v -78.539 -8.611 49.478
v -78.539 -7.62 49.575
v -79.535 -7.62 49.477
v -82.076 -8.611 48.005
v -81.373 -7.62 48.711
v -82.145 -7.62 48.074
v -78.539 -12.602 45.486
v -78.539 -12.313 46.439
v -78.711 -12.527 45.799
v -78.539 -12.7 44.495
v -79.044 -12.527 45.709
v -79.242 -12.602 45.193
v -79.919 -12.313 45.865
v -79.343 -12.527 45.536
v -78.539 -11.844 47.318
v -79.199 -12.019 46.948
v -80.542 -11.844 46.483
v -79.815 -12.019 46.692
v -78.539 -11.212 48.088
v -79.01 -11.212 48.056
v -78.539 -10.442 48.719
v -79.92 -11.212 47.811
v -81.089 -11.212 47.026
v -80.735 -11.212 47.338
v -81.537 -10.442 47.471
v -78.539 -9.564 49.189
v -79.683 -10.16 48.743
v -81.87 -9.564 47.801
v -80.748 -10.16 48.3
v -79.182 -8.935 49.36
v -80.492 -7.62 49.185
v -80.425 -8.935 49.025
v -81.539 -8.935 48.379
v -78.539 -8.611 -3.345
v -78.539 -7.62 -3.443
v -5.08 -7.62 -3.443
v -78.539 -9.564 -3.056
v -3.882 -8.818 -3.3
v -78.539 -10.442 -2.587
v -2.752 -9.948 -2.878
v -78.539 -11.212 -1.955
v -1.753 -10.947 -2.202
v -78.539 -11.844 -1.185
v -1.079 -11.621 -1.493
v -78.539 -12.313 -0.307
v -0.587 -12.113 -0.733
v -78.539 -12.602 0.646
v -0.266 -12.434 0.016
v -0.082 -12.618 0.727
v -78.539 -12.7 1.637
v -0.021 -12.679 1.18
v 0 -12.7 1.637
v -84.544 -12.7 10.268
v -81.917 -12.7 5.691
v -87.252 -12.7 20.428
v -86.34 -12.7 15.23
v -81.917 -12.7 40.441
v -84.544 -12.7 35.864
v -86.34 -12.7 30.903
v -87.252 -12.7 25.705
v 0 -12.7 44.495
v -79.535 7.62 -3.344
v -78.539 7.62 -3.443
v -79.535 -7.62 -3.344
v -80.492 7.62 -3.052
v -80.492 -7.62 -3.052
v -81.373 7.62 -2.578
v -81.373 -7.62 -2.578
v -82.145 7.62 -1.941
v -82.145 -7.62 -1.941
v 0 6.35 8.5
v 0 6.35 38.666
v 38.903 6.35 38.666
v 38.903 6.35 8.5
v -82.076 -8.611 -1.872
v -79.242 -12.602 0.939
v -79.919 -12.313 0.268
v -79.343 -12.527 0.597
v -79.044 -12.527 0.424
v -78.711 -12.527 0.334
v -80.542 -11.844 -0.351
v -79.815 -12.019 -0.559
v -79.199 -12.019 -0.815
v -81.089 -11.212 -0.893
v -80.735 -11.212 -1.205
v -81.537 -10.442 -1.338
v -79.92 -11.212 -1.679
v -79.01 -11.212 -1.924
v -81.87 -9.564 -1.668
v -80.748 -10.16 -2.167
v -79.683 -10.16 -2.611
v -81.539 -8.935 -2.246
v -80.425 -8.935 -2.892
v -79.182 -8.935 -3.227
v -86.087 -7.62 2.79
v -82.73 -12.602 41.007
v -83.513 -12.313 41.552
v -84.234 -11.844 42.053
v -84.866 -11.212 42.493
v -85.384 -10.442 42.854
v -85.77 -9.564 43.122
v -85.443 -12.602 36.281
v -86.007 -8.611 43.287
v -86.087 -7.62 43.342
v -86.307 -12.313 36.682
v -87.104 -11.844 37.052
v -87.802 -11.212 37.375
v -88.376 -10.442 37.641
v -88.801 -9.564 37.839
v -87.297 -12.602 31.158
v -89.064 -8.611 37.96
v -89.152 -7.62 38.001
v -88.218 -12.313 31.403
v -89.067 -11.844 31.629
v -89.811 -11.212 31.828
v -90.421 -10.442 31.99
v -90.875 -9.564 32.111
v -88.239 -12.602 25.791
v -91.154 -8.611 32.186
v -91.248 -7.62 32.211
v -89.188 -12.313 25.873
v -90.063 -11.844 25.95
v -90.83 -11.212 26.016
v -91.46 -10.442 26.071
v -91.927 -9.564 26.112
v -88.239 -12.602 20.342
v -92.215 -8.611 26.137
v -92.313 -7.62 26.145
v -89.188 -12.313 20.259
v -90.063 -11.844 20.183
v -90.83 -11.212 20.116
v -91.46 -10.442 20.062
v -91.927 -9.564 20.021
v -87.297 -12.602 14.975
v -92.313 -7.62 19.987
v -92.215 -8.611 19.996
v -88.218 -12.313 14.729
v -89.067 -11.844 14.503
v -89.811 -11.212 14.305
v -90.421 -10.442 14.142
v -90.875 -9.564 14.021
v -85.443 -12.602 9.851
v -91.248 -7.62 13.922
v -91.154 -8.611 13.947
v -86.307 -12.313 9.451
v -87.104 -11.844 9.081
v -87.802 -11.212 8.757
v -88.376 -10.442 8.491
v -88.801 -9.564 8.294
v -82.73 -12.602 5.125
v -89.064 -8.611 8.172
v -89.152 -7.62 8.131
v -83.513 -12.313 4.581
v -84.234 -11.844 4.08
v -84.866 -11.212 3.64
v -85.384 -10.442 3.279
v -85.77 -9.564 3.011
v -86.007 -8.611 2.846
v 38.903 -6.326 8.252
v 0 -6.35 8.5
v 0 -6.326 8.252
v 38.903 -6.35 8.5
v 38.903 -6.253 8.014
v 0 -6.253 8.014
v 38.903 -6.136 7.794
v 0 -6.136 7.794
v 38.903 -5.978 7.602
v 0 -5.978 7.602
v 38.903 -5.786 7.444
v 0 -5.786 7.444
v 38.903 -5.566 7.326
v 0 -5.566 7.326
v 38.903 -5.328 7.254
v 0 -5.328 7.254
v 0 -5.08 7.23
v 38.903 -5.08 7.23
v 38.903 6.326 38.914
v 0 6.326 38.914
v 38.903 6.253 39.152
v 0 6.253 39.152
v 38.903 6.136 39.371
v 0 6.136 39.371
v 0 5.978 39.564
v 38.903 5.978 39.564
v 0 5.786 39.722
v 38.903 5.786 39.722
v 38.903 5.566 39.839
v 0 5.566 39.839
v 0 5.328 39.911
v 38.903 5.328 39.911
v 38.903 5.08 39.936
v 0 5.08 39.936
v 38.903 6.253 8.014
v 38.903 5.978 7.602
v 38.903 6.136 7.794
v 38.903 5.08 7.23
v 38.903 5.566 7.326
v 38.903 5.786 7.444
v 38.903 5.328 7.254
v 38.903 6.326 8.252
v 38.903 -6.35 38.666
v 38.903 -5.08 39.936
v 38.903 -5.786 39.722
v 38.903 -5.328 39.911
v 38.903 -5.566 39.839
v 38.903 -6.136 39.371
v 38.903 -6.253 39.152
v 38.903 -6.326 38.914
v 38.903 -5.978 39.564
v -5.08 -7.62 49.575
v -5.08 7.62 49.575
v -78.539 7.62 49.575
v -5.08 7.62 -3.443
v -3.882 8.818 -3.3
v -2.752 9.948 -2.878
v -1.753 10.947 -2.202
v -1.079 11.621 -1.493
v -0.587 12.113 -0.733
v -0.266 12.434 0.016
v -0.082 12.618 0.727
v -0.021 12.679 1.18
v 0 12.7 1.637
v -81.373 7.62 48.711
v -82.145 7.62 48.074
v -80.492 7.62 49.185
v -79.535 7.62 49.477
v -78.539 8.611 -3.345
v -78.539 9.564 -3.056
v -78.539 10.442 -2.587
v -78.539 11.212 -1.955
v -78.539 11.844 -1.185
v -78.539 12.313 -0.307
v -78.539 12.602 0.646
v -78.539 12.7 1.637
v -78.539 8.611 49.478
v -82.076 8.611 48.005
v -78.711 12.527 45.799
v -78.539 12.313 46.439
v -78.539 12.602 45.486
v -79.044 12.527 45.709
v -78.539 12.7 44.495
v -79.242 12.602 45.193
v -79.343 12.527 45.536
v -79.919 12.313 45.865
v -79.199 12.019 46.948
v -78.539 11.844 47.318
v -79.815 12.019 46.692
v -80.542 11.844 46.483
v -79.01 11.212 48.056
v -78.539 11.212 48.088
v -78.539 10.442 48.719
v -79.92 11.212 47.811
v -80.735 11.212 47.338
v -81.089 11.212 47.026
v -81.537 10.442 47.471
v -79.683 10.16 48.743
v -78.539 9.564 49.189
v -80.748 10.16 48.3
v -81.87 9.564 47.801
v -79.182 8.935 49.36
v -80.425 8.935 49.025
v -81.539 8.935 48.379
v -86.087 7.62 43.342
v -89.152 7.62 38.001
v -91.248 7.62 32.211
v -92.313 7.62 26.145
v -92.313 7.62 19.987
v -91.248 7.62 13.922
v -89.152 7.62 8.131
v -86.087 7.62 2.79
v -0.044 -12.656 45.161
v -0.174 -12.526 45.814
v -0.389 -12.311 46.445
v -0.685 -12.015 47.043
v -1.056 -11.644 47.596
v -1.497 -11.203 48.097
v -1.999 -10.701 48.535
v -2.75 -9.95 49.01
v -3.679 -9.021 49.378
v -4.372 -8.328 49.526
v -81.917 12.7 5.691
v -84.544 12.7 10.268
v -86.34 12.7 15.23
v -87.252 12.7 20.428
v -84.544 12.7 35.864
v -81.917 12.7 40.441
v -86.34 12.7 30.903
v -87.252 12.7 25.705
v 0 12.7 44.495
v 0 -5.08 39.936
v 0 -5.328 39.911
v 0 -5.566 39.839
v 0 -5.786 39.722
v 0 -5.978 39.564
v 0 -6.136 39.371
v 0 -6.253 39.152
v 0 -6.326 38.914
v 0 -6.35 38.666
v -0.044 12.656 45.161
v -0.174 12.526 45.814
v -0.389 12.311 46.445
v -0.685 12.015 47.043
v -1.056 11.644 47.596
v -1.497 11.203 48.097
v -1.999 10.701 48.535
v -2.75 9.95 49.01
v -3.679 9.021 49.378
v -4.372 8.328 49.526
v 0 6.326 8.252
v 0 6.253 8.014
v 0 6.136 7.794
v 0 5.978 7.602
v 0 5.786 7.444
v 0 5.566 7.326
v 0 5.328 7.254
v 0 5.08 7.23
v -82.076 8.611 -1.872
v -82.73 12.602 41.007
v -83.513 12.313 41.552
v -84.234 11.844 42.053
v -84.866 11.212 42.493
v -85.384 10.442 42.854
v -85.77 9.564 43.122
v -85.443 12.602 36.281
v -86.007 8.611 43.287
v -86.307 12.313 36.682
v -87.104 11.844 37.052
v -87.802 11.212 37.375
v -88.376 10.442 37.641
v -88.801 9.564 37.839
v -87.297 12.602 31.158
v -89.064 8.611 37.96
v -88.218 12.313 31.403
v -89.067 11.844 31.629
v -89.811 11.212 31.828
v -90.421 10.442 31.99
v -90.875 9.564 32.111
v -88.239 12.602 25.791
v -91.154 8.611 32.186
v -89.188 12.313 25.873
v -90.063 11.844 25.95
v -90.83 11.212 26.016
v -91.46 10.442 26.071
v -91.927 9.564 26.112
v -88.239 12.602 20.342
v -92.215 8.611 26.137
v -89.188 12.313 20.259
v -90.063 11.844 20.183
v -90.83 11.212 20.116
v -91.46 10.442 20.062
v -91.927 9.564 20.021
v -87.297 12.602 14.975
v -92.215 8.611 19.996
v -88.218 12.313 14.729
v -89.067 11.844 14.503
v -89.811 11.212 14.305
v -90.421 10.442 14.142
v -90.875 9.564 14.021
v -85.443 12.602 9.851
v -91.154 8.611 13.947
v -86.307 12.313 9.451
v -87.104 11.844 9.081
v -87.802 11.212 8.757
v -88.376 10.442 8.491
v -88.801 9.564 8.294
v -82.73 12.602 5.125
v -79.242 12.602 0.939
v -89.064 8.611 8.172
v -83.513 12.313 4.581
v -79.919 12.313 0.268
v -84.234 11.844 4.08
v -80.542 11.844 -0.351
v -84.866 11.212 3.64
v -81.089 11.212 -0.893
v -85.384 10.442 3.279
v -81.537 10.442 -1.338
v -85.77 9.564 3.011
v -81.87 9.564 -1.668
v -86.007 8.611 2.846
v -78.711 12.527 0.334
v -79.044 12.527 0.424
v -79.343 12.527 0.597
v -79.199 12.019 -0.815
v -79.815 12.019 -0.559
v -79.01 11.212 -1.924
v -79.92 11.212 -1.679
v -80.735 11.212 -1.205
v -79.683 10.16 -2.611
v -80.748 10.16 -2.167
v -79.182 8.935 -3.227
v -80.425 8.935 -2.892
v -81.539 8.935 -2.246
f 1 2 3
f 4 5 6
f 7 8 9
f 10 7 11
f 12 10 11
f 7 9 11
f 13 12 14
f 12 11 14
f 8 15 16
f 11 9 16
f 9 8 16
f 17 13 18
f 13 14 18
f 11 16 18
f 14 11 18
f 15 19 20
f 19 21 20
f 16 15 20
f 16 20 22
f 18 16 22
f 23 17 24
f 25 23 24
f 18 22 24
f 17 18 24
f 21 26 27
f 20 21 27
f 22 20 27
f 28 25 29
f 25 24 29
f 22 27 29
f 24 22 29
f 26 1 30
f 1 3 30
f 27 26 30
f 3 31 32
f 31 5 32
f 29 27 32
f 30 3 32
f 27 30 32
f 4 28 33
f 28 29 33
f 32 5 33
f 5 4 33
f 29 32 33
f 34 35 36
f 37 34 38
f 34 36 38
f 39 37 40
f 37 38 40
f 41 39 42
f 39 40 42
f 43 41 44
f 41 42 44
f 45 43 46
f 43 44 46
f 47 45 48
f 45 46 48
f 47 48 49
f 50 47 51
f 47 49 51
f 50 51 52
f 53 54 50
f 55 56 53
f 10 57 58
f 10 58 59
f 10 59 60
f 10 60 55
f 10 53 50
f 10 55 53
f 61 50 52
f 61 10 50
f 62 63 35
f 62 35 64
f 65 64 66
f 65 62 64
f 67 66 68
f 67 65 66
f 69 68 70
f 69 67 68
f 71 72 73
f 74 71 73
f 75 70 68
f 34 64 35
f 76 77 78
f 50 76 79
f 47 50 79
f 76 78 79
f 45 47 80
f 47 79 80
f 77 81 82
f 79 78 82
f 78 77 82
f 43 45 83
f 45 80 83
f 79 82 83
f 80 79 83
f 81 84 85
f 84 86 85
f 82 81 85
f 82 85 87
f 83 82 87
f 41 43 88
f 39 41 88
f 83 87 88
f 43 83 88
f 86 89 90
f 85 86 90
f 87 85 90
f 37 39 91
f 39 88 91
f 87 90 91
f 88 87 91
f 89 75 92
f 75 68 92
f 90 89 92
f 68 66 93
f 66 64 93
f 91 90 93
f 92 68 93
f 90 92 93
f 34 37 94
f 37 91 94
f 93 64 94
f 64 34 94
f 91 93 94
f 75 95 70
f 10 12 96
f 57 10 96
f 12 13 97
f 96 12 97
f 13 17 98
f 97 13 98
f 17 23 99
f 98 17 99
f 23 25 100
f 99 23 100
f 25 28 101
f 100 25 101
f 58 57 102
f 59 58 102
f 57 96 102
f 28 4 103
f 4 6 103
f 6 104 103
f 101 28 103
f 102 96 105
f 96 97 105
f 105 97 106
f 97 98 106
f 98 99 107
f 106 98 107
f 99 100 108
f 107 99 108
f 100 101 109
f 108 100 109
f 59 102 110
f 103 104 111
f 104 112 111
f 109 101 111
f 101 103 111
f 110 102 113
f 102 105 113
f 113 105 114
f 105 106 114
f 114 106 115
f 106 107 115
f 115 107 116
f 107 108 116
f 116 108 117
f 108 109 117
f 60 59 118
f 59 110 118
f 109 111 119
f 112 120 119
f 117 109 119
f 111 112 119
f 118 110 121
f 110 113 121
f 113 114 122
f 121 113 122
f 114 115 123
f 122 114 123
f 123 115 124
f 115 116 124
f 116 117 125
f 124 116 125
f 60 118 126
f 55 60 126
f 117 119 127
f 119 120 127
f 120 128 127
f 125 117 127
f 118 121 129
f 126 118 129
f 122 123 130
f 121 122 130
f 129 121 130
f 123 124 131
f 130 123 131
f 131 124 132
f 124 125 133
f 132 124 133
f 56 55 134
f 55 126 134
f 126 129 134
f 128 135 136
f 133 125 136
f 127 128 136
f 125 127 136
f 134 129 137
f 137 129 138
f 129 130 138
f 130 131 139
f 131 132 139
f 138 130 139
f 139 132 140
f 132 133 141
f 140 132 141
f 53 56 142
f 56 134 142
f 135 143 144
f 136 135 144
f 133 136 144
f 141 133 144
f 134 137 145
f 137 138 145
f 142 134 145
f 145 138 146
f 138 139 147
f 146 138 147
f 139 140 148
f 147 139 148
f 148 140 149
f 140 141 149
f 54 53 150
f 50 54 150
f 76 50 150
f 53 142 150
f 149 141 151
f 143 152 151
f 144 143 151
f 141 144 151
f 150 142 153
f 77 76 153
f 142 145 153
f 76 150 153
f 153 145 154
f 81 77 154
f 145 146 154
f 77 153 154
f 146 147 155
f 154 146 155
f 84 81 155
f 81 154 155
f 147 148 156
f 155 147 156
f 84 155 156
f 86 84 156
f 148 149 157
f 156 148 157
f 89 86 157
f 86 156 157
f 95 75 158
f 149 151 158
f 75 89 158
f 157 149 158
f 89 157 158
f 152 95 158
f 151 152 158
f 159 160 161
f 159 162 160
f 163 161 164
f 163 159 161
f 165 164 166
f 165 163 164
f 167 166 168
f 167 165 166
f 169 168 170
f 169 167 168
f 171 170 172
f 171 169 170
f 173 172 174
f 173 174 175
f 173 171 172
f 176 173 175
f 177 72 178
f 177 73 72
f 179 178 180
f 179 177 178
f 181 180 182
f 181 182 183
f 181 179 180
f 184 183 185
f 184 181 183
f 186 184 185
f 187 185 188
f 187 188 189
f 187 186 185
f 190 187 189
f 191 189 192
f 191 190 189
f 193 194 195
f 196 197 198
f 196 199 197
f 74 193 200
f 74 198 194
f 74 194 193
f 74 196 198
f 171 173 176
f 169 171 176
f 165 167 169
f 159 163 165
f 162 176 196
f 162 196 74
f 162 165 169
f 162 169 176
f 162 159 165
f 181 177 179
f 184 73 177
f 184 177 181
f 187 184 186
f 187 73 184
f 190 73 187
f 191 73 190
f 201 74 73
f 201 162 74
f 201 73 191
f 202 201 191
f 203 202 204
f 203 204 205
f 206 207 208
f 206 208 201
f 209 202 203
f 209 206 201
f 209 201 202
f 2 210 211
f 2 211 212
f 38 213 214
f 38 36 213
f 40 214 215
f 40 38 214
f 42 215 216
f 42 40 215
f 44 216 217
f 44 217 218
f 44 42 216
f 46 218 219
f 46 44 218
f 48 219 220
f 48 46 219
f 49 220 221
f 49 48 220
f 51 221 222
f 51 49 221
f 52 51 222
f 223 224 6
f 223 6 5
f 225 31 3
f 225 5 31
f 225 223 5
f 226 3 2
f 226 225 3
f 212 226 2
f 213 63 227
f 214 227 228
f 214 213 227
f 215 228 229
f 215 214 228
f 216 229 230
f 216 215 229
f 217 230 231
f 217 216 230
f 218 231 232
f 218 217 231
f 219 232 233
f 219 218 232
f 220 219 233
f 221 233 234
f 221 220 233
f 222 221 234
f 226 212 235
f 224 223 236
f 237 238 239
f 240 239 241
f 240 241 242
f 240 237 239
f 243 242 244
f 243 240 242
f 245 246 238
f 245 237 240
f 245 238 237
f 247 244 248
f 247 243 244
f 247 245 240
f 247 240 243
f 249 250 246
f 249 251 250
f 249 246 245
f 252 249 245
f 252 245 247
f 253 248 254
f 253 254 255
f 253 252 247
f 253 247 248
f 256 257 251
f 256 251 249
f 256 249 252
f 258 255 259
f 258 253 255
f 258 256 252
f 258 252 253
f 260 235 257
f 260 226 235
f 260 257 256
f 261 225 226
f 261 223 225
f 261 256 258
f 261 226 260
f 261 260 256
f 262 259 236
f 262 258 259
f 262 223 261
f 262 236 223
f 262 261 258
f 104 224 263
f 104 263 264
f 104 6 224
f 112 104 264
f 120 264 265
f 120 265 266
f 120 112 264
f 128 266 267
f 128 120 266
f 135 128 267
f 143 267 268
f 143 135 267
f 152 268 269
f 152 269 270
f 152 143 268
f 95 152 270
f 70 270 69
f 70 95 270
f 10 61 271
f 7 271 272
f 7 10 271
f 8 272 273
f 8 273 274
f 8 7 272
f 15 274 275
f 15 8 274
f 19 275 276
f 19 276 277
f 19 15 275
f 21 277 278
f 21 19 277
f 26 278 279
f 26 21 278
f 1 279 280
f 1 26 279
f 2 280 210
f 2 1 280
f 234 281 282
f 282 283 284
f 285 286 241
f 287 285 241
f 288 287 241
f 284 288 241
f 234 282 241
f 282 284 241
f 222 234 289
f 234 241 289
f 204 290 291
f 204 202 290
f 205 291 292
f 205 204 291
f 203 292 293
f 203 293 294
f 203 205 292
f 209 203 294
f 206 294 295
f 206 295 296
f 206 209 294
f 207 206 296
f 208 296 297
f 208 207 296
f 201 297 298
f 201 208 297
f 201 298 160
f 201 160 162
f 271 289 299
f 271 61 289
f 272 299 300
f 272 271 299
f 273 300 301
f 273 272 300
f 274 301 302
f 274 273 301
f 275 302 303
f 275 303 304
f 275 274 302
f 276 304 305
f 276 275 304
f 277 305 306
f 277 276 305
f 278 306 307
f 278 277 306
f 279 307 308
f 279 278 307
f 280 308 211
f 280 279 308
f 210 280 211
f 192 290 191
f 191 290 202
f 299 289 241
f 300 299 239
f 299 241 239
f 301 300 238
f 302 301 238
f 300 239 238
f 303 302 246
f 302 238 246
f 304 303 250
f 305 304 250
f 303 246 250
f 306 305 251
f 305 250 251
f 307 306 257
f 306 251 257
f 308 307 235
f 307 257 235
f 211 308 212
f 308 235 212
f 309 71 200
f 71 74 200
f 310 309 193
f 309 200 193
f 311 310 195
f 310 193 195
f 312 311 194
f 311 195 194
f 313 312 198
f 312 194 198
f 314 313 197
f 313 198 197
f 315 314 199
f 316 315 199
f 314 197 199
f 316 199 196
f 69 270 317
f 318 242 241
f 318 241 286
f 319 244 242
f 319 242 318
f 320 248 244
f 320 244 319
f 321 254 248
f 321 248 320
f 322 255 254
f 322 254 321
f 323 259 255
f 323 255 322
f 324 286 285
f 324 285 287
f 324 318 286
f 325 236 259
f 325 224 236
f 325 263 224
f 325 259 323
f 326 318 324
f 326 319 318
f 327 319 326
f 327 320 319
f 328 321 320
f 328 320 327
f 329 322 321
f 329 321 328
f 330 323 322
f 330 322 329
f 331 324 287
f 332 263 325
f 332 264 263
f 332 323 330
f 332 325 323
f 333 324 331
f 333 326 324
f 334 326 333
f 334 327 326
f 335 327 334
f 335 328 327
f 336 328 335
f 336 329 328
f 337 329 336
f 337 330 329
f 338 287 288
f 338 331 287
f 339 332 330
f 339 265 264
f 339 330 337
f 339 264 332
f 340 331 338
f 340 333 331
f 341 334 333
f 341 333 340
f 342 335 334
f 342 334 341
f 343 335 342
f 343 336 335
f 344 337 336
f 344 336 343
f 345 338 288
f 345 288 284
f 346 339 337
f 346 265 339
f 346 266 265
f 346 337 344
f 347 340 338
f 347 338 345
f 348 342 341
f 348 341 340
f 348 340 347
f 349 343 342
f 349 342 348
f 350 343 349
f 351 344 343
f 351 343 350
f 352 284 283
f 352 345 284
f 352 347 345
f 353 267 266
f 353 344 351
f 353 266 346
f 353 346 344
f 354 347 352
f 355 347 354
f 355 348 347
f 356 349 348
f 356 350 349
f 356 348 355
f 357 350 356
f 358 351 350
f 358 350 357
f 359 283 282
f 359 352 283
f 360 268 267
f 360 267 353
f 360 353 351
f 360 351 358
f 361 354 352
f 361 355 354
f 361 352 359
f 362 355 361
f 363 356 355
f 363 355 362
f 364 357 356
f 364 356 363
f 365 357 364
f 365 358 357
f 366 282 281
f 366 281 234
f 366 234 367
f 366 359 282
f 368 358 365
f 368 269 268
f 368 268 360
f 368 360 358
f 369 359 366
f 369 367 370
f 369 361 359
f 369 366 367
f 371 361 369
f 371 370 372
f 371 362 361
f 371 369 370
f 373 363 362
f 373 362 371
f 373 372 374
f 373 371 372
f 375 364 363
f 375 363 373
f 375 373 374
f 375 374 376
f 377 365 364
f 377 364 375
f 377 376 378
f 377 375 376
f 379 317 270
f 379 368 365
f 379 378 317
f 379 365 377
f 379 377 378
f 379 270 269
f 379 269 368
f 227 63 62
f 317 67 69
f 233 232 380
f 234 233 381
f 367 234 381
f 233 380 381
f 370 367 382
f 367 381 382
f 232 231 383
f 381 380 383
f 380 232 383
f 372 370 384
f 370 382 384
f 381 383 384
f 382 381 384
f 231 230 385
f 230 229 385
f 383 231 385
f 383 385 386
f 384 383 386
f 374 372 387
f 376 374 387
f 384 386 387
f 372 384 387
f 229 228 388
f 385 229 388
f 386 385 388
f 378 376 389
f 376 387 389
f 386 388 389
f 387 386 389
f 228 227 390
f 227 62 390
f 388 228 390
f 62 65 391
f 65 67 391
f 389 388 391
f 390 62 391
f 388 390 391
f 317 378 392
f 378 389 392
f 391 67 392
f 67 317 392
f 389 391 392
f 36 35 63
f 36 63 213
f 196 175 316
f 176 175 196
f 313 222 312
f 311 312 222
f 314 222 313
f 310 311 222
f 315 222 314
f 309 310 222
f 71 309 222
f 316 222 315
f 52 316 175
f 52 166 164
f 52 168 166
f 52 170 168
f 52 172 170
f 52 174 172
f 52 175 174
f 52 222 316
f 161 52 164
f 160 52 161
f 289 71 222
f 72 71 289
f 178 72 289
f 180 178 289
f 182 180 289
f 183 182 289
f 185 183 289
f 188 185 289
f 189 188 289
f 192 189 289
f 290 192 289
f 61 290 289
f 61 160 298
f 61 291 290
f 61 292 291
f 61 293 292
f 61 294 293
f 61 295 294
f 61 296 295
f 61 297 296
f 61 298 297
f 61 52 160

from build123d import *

# Parameters (mm, degrees)
F2_DEPTH = 12.7
F1_W     = 38.9029346406
F1_H     = 32.7060050331
F3_DEPTH = 6.35
F4_R     = 5.08
F5_R     = 1.27


# Not quite as in the source:
# - two fillets or chamfers of one size are made in one step
# - a feature names something its author has since deleted; it is built from what else it names


with BuildPart() as f2:
    # F0 (on Front) → F2 (new body, symmetric)
    with BuildSketch(Plane.XZ):
        with BuildLine():
            Line((-80.5600658059, -3.4427349456), (0, -3.4427349456))
            Line((0, -3.4427349456), (0, 49.5754186995))
            Line((0, 49.5754186995), (-80.5600658059, 49.5754186995))
            ThreePointArc((-80.5600658059, 49.5754186995), (-92.446291157, 23.066341877), (-80.5600658059, -3.4427349456))
        make_face()
    extrude(amount=F2_DEPTH, both=True)

    # F1 (on Front) → F3 (join, symmetric)
    with BuildSketch(Plane.XZ):
        with Locations((19.4514673203, 23.5827539582)):
            Rectangle(F1_W, F1_H)
    extrude(amount=F3_DEPTH, both=True)

    # F4
    f4_edges = [f2.edges().sort_by_distance(p)[0] for p in [
        (-40.280033, -12.7, -3.442735),
        (-40.280033, -12.7, 49.575419),
        (-40.280033, 12.7, -3.442735),
        (-40.280033, 12.7, 49.575419),
        (-92.446291, 12.7, 23.066342),
        (-80.560066, 0, -3.442735),
        (-92.446291, -12.7, 23.066342),
        (-80.560066, 0, 49.575419),
        (0, 0, -3.442735),
        (0, 0, 49.575419),
    ]]
    fillet(f4_edges, radius=F4_R)

    # F5
    f5_edges = [f2.edges().sort_by_distance(p)[0] for p in [
        (19.451467, -6.35, 39.935756),
        (19.451467, -6.35, 7.229751),
        (19.451467, 6.35, 39.935756),
        (19.451467, 6.35, 7.229751),
    ]]
    fillet(f5_edges, radius=F5_R)


solid = f2.part
